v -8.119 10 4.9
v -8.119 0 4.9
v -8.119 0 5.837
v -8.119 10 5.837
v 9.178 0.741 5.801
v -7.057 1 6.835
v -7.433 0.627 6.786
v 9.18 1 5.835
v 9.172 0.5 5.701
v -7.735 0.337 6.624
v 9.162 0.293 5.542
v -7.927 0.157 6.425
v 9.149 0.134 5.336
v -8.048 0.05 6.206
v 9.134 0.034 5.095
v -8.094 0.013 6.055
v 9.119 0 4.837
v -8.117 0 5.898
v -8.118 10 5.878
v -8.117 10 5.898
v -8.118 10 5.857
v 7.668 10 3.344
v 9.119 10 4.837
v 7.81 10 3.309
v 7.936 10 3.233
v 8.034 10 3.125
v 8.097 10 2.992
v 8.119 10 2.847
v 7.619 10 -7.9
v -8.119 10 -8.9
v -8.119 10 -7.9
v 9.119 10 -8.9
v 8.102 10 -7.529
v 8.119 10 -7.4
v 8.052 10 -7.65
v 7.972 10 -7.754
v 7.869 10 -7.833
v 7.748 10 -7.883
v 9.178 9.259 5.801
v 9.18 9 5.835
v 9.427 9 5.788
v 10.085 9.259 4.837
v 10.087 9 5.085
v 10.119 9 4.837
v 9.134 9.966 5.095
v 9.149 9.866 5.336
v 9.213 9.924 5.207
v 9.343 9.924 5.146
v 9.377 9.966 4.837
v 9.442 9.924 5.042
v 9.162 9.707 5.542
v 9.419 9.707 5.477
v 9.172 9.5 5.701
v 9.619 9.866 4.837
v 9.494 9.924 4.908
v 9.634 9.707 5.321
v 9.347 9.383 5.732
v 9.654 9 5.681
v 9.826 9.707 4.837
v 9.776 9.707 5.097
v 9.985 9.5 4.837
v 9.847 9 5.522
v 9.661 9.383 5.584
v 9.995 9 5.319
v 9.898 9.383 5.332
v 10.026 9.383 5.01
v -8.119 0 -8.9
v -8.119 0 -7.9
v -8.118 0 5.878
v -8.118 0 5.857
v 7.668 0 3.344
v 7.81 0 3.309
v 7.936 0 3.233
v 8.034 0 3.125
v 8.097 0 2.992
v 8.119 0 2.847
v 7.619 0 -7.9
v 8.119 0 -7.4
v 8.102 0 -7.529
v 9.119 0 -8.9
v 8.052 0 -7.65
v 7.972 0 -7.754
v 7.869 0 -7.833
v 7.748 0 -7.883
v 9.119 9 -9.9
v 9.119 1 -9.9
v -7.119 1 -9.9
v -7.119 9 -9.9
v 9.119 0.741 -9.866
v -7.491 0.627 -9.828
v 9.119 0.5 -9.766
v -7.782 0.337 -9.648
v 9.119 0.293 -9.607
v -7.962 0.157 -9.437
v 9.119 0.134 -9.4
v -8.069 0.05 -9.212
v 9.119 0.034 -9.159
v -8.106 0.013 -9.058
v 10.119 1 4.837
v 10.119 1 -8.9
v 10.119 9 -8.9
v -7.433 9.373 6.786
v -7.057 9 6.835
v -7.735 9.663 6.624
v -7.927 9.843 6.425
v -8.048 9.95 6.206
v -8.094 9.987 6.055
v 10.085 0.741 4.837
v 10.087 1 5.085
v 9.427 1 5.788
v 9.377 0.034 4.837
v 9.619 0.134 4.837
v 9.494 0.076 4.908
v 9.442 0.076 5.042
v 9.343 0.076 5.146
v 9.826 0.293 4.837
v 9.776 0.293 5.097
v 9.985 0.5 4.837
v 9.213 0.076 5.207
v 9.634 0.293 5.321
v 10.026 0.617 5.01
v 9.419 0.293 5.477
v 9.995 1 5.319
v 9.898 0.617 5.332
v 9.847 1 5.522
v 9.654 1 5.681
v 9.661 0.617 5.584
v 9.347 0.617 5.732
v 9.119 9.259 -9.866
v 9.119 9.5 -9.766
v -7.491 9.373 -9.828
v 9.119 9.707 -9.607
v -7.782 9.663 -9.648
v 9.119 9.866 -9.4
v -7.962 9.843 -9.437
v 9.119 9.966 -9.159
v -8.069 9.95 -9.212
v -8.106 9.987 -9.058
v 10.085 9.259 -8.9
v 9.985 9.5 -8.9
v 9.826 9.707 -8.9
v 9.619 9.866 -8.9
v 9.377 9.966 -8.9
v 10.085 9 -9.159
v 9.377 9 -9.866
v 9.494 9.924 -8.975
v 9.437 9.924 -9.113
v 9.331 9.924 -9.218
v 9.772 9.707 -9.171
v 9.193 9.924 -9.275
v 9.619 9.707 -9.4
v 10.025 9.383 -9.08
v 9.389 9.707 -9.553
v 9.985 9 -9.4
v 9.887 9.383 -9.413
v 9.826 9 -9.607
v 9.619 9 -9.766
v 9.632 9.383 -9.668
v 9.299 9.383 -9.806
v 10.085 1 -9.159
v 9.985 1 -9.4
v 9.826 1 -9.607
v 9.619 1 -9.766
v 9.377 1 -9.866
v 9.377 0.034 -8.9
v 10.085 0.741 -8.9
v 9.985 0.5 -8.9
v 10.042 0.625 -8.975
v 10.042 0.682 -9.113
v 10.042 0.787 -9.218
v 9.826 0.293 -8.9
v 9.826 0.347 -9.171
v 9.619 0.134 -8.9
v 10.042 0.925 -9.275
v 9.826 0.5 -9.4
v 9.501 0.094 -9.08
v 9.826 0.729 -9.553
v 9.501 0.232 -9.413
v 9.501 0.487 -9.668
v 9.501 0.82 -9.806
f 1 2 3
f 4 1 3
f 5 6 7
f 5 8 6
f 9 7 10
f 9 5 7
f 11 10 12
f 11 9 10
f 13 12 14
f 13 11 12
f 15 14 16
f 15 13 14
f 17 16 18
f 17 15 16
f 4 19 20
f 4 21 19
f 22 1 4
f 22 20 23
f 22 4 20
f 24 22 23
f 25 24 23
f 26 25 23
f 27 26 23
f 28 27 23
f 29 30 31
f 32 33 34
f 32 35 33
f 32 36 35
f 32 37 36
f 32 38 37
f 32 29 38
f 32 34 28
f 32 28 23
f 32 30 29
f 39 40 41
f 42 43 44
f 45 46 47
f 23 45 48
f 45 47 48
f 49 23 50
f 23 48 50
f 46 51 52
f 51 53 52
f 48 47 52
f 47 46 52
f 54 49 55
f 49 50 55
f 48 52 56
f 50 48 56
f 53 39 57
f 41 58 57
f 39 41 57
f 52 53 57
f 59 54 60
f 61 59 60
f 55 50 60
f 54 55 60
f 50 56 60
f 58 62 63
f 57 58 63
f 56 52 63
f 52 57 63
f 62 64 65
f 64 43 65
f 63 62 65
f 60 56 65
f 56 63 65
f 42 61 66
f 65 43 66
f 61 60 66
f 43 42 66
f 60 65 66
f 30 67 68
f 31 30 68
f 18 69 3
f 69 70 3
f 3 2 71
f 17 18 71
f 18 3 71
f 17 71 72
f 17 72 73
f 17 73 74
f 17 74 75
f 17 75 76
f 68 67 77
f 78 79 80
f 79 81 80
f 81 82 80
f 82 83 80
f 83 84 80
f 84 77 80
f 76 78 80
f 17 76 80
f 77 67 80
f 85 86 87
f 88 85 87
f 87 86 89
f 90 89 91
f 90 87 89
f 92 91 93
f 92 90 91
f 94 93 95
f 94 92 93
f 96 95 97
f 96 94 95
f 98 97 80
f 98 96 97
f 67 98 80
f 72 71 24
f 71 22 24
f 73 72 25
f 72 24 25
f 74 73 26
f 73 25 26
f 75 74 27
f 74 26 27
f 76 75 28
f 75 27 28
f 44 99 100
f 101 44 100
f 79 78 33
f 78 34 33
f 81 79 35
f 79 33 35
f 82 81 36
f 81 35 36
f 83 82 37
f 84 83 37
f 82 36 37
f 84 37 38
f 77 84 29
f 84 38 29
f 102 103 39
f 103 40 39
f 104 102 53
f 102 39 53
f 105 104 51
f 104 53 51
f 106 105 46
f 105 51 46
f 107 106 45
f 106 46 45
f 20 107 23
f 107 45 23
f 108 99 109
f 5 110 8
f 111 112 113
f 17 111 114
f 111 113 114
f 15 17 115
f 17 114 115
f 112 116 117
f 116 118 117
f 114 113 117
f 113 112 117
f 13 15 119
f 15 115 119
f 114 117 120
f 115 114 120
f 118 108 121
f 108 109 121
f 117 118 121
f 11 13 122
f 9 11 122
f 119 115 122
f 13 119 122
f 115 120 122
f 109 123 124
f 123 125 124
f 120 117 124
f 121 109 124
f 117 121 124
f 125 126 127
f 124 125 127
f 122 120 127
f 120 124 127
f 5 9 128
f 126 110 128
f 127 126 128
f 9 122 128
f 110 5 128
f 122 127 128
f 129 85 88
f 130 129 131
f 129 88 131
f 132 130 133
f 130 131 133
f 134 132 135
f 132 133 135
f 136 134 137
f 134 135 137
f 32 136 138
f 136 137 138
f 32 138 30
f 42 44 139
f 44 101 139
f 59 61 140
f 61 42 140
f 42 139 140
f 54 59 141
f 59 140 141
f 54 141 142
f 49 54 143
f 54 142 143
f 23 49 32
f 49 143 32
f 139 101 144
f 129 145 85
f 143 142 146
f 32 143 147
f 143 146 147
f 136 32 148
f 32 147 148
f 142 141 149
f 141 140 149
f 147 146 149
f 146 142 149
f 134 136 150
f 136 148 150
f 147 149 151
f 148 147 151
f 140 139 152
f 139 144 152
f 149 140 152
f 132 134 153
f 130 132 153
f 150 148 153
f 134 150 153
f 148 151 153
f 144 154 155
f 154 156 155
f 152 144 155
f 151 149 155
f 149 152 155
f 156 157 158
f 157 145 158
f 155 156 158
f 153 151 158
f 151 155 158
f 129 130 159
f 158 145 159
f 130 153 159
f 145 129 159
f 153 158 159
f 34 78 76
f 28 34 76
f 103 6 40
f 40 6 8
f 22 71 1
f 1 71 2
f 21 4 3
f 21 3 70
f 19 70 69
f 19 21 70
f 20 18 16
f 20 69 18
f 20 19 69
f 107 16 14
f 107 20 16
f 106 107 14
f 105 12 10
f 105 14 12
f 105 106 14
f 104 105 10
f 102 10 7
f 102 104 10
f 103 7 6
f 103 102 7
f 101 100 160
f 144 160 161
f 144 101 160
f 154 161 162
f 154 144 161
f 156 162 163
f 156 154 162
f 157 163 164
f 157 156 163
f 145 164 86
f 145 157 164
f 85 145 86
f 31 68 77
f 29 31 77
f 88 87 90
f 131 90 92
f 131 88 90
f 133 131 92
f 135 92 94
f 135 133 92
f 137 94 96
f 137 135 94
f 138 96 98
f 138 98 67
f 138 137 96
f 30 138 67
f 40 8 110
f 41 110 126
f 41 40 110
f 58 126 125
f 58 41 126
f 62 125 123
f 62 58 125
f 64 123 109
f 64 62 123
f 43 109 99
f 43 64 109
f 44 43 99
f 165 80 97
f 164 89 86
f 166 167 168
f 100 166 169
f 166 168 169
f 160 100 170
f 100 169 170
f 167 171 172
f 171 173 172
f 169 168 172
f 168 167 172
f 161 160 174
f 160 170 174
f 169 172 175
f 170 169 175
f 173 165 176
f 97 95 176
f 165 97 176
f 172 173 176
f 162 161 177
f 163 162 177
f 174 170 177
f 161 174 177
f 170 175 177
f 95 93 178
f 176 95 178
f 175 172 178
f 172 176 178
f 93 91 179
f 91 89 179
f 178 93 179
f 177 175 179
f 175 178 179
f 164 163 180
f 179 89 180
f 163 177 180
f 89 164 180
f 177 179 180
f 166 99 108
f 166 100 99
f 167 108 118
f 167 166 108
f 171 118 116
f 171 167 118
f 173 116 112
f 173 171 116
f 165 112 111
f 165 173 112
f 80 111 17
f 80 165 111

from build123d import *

# Parameters (mm, degrees)
BOSS_EXTRUDE1_DEPTH = 10
FILLET1_R           = 1
FILLET2_R           = 0.5


with BuildPart() as part:
    # Sketch1 → Boss-Extrude1 (new body)
    with BuildSketch(Plane(origin=(0, 0, 0), x_dir=(1, 0, 0), z_dir=(0, 1, 0))):
        Polygon((-8.118577075, -4.9), (-8.118577075, -6.9), (10.118577075, -5.776825706), (10.118577075, 9.9), (-8.118577075, 9.9), (-8.118577075, 7.9), (8.118577075, 7.9), (8.118577075, -3.3), align=None)
    extrude(amount=BOSS_EXTRUDE1_DEPTH)

    # Fillet1
    fillet1_edges = [part.edges().sort_by_distance(p)[0] for p in [
        (1, 0, -9.9),
        (10.118577075, 0, -2.061587147),
        (1, 0, 6.338412853),
        (-8.118577075, 5, -9.9),
        (10.118577075, 5, -9.9),
        (10.118577075, 5, 5.776825706),
        (-8.118577075, 5, 6.9),
        (1, 10, 6.338412853),
        (10.118577075, 10, -2.061587147),
        (1, 10, -9.9),
    ]]
    fillet(fillet1_edges, radius=FILLET1_R)

    # Fillet2
    fillet2_edges = [part.edges().sort_by_distance(p)[0] for p in [
        (8.118577075, 5, -7.9),
        (8.118577075, 5, 3.3),
    ]]
    fillet(fillet2_edges, radius=FILLET2_R)


solid = part.part
